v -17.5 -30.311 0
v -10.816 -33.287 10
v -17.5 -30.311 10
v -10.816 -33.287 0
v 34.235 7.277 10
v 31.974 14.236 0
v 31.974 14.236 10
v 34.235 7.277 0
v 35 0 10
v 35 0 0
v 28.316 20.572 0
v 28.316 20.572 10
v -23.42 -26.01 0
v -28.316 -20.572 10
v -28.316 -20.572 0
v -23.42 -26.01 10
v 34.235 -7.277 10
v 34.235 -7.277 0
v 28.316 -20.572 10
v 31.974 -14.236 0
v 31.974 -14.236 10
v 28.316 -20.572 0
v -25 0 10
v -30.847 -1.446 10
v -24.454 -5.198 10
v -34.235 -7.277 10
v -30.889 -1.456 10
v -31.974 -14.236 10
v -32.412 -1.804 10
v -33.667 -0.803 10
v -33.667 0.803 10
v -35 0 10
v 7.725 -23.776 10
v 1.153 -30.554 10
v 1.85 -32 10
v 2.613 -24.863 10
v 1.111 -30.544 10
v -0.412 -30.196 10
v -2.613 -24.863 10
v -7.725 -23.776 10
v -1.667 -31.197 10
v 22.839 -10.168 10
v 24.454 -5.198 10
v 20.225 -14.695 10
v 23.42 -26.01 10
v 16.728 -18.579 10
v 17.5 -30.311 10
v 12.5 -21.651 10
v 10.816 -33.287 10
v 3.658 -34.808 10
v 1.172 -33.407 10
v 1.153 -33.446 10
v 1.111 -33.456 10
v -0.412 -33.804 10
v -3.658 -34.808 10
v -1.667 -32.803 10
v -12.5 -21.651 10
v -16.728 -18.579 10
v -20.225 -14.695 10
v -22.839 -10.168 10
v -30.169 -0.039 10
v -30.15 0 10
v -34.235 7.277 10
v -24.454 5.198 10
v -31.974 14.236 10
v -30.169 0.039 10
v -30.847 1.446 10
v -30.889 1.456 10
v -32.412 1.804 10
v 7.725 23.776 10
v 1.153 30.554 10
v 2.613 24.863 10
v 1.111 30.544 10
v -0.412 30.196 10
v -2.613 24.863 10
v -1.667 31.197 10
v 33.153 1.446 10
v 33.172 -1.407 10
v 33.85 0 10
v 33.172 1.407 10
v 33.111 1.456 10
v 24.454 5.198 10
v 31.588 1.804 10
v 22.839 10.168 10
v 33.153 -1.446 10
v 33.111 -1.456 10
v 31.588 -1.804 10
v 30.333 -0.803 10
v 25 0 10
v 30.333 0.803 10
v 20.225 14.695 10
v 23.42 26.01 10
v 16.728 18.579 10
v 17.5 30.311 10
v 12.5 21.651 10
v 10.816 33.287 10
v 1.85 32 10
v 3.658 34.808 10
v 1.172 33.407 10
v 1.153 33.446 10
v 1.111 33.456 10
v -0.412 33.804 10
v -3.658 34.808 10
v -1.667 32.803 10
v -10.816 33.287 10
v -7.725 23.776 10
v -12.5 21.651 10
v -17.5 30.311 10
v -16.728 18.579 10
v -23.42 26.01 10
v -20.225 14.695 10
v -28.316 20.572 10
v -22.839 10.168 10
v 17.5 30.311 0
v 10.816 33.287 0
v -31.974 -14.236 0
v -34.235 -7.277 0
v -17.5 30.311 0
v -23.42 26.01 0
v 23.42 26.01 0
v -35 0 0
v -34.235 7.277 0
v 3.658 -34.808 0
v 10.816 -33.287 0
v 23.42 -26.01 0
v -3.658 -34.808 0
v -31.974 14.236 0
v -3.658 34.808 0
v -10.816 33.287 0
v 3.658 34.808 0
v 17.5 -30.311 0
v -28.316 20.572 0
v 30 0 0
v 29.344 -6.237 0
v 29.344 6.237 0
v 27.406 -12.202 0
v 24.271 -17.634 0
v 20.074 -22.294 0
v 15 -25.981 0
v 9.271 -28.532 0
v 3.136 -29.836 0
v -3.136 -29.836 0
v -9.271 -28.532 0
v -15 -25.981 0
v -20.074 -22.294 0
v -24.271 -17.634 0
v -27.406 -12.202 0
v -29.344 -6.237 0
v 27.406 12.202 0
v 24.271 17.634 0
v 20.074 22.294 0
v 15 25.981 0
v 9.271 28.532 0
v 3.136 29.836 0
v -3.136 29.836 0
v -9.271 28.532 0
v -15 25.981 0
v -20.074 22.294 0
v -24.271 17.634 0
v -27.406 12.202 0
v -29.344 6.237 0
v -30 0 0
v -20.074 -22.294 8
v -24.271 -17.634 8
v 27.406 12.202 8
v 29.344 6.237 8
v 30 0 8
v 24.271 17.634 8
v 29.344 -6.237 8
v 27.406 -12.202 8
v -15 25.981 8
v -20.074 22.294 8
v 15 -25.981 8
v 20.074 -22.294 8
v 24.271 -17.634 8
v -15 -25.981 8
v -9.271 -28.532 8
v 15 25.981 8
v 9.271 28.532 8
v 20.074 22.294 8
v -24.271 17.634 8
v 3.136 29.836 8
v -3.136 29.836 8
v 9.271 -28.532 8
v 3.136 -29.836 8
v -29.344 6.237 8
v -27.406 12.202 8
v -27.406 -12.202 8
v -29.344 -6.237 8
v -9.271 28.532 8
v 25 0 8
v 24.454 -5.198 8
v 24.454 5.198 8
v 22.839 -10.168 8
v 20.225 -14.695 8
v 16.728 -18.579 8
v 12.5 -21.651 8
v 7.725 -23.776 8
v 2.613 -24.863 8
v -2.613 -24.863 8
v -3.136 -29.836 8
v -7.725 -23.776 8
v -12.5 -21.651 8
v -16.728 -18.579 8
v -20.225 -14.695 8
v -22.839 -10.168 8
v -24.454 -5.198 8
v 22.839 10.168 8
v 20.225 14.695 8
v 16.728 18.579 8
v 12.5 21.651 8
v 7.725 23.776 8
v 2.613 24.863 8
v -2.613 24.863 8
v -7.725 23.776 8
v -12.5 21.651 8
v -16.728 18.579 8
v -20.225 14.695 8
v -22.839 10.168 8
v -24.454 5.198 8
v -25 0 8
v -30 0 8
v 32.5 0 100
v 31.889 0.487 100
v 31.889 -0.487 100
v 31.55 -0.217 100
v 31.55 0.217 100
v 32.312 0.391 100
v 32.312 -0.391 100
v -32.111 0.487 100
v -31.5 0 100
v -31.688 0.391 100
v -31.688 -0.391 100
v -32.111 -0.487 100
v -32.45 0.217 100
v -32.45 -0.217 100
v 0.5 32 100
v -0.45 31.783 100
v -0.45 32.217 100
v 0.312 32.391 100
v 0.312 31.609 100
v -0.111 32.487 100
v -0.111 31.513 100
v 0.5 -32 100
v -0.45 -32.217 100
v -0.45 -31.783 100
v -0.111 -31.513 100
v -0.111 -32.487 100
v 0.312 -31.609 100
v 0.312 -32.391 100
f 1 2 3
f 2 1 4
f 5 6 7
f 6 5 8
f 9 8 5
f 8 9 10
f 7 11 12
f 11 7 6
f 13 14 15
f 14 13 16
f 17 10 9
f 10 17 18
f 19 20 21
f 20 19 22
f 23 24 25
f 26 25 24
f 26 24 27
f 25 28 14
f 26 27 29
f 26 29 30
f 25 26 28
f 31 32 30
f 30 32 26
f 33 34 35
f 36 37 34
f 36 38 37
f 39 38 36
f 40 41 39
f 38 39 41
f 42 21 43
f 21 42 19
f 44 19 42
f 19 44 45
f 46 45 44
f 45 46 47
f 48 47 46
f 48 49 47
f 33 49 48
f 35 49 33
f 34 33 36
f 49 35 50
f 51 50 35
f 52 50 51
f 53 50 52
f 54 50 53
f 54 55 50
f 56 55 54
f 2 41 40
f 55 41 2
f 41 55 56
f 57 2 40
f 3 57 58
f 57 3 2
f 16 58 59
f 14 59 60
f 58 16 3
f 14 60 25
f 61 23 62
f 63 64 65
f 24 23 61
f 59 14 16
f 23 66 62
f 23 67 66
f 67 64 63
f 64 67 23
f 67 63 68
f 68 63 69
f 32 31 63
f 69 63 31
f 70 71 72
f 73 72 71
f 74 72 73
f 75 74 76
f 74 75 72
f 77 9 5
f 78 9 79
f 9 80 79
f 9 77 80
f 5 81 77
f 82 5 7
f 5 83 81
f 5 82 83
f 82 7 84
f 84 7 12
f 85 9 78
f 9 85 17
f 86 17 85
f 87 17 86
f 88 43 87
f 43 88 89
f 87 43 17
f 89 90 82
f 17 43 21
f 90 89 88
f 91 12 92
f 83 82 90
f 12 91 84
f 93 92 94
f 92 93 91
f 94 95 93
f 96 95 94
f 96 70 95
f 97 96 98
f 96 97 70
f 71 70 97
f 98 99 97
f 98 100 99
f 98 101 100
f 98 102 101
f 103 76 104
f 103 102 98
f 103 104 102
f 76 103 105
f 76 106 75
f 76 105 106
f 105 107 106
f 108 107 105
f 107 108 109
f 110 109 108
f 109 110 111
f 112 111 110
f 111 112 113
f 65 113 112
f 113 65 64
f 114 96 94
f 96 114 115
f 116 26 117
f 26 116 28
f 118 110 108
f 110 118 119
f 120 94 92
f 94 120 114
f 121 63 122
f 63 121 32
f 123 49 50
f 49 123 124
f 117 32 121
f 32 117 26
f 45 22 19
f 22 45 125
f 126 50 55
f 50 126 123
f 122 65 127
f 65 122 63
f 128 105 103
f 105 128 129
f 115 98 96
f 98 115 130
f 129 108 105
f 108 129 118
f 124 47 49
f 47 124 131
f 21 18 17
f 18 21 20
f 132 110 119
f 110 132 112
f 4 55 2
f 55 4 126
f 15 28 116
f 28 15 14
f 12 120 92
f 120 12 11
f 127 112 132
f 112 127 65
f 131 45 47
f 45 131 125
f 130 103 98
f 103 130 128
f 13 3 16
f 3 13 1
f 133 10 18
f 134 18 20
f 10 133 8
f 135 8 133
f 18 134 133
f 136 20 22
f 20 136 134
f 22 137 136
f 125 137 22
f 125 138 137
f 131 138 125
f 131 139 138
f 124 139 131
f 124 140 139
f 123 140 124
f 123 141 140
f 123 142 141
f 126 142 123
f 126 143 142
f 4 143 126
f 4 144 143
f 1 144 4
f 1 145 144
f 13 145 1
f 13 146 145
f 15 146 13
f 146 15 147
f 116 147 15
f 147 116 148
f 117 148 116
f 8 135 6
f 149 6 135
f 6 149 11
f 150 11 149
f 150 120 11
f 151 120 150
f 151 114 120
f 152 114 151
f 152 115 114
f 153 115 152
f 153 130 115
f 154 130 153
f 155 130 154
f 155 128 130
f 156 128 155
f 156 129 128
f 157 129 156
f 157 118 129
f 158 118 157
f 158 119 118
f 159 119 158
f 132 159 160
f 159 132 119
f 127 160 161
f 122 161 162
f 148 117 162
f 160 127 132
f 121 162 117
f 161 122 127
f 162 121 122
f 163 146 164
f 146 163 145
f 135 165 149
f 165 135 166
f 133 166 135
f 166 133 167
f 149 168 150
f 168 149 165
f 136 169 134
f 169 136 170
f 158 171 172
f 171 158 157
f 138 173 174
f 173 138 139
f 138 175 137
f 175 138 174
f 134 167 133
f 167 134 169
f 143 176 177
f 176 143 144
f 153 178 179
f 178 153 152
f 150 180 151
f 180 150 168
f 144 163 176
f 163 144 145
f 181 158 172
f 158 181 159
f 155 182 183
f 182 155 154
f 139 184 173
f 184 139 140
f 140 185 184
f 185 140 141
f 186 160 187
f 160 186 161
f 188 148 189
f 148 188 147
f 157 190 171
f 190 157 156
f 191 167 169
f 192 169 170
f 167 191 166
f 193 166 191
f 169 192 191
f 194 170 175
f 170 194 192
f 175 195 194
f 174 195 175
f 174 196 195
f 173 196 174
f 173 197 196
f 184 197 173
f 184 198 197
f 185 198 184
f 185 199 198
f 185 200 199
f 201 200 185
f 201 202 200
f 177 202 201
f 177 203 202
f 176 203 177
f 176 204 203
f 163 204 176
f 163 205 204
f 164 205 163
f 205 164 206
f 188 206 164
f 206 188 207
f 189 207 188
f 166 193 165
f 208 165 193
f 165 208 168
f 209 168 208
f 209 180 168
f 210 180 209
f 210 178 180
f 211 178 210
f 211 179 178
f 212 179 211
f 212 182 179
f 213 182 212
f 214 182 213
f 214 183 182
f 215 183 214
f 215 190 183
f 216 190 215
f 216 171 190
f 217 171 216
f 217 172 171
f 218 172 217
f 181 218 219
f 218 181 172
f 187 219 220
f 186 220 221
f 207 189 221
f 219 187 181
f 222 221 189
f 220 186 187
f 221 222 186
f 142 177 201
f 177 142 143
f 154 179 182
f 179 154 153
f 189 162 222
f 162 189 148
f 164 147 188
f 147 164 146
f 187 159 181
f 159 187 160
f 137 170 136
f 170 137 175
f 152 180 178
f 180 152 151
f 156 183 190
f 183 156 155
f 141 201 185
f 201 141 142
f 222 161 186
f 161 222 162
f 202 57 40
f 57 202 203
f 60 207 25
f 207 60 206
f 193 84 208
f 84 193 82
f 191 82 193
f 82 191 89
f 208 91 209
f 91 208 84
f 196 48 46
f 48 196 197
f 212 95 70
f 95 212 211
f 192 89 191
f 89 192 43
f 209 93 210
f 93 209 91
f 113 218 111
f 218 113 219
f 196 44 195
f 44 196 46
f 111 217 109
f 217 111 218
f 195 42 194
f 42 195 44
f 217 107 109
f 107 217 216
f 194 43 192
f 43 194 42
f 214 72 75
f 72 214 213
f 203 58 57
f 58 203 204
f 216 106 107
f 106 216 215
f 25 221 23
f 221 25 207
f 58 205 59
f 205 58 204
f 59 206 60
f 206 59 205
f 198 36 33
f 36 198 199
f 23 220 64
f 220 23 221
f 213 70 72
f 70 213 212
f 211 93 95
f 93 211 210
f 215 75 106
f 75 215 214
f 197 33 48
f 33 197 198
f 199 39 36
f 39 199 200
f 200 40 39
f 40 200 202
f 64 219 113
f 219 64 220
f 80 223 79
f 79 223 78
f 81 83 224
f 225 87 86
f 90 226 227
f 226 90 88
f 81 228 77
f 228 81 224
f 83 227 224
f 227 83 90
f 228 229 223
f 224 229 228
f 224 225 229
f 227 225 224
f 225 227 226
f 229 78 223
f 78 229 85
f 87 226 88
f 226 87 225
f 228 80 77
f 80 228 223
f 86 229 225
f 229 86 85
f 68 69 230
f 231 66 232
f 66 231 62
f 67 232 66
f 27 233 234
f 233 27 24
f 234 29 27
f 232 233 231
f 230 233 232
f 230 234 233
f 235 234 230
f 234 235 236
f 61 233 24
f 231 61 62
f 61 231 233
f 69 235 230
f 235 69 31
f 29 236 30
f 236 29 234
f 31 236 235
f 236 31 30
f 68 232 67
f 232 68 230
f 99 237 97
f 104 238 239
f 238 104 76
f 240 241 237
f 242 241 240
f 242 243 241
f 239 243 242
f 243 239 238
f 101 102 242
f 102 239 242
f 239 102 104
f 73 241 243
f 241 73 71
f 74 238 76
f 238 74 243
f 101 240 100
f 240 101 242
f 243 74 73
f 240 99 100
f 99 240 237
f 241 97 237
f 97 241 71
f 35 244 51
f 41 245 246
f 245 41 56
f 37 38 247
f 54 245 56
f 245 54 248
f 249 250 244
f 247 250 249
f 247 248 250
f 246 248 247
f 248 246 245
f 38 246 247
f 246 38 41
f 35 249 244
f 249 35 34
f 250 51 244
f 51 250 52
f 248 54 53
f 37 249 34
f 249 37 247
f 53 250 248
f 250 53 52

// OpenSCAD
cylinder_radius = 35;
cylinder_height = 10;
union () {
    difference() {
        cylinder( r = cylinder_radius, h = cylinder_height);
        translate([0,0,-4])
        cylinder( r = cylinder_radius-5, h = cylinder_height+2);
        translate([0,0,1])
        cylinder( r = cylinder_radius-10, h = cylinder_height+5);
    }
    //legs
    translate([cylinder_radius-3,0,0])
        cylinder(r1=2, r2=0.5, h=100);
    translate([-cylinder_radius+3,0,0])
        cylinder(r1=2, r2=0.5, h=100);
    translate([0,cylinder_radius-3,0])
        cylinder(r1=2, r2=0.5, h=100);
    translate([0,-cylinder_radius+3,0])
        cylinder(r1=2, r2=0.5, h=100);
}
